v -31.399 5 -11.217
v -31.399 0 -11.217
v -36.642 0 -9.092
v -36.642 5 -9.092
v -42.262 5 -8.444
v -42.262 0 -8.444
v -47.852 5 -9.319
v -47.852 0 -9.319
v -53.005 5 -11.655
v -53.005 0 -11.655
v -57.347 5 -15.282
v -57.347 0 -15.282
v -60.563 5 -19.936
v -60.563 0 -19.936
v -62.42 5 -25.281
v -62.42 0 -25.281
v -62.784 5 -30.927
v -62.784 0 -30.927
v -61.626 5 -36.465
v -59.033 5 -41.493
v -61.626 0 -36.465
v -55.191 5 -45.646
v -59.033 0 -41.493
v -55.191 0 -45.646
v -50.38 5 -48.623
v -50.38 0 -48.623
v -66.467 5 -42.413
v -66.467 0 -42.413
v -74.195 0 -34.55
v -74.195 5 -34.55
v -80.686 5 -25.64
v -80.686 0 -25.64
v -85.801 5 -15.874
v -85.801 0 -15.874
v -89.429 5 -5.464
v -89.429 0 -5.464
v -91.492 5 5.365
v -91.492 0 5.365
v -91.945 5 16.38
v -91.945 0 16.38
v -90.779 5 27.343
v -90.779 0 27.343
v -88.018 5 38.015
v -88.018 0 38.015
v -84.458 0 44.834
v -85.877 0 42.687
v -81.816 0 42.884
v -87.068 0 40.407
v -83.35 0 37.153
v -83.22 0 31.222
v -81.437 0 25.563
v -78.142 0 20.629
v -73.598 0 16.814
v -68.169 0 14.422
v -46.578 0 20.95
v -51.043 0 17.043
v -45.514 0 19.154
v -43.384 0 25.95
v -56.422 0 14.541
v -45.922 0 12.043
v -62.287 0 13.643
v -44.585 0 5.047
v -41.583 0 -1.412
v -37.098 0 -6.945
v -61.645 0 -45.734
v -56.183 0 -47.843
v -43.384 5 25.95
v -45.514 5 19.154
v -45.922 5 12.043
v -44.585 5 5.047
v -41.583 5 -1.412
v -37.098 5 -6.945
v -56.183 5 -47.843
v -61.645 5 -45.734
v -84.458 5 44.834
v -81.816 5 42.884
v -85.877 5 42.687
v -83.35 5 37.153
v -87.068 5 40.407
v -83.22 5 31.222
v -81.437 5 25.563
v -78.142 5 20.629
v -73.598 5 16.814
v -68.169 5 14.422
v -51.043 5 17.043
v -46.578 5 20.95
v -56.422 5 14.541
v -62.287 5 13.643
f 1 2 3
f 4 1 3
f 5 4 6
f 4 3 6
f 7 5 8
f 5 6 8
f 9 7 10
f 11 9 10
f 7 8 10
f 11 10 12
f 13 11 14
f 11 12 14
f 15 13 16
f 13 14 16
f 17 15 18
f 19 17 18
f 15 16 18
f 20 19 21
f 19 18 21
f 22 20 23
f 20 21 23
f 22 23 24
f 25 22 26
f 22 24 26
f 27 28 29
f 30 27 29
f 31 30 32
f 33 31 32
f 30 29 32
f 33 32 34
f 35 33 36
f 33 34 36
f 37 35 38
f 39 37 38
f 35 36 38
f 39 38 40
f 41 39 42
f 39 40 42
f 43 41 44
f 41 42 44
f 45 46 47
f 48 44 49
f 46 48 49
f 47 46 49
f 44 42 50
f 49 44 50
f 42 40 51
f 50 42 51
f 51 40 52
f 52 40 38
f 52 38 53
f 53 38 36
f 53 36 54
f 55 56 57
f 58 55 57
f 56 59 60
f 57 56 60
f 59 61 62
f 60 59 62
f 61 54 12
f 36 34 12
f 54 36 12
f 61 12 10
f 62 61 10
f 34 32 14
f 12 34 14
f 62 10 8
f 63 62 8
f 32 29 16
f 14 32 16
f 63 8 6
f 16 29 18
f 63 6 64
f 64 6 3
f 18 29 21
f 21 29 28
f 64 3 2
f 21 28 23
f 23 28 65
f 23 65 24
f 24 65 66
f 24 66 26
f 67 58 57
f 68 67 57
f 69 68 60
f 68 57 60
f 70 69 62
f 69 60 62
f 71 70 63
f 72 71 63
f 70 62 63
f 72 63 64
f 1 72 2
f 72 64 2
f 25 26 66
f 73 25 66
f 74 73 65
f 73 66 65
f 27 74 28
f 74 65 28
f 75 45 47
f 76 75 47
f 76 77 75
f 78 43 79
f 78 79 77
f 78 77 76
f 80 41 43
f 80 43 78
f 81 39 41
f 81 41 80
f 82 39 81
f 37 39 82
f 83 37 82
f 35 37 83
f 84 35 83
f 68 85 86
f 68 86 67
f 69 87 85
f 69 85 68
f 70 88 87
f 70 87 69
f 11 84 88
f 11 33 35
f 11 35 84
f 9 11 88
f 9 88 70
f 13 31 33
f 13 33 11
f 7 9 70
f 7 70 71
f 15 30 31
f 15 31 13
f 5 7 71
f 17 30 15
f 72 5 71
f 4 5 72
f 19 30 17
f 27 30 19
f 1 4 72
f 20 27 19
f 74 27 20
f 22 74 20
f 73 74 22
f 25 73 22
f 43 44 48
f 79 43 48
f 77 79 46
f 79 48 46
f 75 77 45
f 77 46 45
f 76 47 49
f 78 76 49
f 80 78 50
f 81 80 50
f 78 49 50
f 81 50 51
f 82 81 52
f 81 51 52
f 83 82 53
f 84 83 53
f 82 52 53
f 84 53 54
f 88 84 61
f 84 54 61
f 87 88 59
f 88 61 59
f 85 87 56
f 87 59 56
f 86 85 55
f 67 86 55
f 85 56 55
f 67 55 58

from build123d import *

# Parameters (mm, degrees)
BOSS_EXTRU_1_DEPTH = 5


with BuildPart() as part:
    # Esquisse1 → Boss.-Extru.1 (new body)
    with BuildSketch(Plane(origin=(0, 0, 0), x_dir=(1, 0, 0), z_dir=(0, 1, 0))):
        with BuildLine():
            ThreePointArc((-88.017976153, -38.015428103), (-86.50201361, -41.562295618), (-84.458479206, -44.833744647))
            Line((-84.458479206, -44.833744647), (-81.815842439, -42.884303709))
            ThreePointArc((-81.815842439, -42.884303709), (-70.968463998, -15.424955777), (-43.384090899, -25.950342641))
            ThreePointArc((-43.384090899, -25.950342641), (-44.585088361, -5.046948778), (-31.398618719, 11.21685423))
            ThreePointArc((-31.398618719, 11.21685423), (-60.563222829, 19.936478121), (-50.379796194, 48.622777911))
            ThreePointArc((-50.379796194, 48.622777911), (-58.97592755, 46.948798531), (-66.46729281, 42.41281707))
            ThreePointArc((-66.46729281, 42.41281707), (-89.429119341, 5.46405326), (-88.017976153, -38.015428103))
        make_face()
    extrude(amount=BOSS_EXTRU_1_DEPTH)


solid = part.part
